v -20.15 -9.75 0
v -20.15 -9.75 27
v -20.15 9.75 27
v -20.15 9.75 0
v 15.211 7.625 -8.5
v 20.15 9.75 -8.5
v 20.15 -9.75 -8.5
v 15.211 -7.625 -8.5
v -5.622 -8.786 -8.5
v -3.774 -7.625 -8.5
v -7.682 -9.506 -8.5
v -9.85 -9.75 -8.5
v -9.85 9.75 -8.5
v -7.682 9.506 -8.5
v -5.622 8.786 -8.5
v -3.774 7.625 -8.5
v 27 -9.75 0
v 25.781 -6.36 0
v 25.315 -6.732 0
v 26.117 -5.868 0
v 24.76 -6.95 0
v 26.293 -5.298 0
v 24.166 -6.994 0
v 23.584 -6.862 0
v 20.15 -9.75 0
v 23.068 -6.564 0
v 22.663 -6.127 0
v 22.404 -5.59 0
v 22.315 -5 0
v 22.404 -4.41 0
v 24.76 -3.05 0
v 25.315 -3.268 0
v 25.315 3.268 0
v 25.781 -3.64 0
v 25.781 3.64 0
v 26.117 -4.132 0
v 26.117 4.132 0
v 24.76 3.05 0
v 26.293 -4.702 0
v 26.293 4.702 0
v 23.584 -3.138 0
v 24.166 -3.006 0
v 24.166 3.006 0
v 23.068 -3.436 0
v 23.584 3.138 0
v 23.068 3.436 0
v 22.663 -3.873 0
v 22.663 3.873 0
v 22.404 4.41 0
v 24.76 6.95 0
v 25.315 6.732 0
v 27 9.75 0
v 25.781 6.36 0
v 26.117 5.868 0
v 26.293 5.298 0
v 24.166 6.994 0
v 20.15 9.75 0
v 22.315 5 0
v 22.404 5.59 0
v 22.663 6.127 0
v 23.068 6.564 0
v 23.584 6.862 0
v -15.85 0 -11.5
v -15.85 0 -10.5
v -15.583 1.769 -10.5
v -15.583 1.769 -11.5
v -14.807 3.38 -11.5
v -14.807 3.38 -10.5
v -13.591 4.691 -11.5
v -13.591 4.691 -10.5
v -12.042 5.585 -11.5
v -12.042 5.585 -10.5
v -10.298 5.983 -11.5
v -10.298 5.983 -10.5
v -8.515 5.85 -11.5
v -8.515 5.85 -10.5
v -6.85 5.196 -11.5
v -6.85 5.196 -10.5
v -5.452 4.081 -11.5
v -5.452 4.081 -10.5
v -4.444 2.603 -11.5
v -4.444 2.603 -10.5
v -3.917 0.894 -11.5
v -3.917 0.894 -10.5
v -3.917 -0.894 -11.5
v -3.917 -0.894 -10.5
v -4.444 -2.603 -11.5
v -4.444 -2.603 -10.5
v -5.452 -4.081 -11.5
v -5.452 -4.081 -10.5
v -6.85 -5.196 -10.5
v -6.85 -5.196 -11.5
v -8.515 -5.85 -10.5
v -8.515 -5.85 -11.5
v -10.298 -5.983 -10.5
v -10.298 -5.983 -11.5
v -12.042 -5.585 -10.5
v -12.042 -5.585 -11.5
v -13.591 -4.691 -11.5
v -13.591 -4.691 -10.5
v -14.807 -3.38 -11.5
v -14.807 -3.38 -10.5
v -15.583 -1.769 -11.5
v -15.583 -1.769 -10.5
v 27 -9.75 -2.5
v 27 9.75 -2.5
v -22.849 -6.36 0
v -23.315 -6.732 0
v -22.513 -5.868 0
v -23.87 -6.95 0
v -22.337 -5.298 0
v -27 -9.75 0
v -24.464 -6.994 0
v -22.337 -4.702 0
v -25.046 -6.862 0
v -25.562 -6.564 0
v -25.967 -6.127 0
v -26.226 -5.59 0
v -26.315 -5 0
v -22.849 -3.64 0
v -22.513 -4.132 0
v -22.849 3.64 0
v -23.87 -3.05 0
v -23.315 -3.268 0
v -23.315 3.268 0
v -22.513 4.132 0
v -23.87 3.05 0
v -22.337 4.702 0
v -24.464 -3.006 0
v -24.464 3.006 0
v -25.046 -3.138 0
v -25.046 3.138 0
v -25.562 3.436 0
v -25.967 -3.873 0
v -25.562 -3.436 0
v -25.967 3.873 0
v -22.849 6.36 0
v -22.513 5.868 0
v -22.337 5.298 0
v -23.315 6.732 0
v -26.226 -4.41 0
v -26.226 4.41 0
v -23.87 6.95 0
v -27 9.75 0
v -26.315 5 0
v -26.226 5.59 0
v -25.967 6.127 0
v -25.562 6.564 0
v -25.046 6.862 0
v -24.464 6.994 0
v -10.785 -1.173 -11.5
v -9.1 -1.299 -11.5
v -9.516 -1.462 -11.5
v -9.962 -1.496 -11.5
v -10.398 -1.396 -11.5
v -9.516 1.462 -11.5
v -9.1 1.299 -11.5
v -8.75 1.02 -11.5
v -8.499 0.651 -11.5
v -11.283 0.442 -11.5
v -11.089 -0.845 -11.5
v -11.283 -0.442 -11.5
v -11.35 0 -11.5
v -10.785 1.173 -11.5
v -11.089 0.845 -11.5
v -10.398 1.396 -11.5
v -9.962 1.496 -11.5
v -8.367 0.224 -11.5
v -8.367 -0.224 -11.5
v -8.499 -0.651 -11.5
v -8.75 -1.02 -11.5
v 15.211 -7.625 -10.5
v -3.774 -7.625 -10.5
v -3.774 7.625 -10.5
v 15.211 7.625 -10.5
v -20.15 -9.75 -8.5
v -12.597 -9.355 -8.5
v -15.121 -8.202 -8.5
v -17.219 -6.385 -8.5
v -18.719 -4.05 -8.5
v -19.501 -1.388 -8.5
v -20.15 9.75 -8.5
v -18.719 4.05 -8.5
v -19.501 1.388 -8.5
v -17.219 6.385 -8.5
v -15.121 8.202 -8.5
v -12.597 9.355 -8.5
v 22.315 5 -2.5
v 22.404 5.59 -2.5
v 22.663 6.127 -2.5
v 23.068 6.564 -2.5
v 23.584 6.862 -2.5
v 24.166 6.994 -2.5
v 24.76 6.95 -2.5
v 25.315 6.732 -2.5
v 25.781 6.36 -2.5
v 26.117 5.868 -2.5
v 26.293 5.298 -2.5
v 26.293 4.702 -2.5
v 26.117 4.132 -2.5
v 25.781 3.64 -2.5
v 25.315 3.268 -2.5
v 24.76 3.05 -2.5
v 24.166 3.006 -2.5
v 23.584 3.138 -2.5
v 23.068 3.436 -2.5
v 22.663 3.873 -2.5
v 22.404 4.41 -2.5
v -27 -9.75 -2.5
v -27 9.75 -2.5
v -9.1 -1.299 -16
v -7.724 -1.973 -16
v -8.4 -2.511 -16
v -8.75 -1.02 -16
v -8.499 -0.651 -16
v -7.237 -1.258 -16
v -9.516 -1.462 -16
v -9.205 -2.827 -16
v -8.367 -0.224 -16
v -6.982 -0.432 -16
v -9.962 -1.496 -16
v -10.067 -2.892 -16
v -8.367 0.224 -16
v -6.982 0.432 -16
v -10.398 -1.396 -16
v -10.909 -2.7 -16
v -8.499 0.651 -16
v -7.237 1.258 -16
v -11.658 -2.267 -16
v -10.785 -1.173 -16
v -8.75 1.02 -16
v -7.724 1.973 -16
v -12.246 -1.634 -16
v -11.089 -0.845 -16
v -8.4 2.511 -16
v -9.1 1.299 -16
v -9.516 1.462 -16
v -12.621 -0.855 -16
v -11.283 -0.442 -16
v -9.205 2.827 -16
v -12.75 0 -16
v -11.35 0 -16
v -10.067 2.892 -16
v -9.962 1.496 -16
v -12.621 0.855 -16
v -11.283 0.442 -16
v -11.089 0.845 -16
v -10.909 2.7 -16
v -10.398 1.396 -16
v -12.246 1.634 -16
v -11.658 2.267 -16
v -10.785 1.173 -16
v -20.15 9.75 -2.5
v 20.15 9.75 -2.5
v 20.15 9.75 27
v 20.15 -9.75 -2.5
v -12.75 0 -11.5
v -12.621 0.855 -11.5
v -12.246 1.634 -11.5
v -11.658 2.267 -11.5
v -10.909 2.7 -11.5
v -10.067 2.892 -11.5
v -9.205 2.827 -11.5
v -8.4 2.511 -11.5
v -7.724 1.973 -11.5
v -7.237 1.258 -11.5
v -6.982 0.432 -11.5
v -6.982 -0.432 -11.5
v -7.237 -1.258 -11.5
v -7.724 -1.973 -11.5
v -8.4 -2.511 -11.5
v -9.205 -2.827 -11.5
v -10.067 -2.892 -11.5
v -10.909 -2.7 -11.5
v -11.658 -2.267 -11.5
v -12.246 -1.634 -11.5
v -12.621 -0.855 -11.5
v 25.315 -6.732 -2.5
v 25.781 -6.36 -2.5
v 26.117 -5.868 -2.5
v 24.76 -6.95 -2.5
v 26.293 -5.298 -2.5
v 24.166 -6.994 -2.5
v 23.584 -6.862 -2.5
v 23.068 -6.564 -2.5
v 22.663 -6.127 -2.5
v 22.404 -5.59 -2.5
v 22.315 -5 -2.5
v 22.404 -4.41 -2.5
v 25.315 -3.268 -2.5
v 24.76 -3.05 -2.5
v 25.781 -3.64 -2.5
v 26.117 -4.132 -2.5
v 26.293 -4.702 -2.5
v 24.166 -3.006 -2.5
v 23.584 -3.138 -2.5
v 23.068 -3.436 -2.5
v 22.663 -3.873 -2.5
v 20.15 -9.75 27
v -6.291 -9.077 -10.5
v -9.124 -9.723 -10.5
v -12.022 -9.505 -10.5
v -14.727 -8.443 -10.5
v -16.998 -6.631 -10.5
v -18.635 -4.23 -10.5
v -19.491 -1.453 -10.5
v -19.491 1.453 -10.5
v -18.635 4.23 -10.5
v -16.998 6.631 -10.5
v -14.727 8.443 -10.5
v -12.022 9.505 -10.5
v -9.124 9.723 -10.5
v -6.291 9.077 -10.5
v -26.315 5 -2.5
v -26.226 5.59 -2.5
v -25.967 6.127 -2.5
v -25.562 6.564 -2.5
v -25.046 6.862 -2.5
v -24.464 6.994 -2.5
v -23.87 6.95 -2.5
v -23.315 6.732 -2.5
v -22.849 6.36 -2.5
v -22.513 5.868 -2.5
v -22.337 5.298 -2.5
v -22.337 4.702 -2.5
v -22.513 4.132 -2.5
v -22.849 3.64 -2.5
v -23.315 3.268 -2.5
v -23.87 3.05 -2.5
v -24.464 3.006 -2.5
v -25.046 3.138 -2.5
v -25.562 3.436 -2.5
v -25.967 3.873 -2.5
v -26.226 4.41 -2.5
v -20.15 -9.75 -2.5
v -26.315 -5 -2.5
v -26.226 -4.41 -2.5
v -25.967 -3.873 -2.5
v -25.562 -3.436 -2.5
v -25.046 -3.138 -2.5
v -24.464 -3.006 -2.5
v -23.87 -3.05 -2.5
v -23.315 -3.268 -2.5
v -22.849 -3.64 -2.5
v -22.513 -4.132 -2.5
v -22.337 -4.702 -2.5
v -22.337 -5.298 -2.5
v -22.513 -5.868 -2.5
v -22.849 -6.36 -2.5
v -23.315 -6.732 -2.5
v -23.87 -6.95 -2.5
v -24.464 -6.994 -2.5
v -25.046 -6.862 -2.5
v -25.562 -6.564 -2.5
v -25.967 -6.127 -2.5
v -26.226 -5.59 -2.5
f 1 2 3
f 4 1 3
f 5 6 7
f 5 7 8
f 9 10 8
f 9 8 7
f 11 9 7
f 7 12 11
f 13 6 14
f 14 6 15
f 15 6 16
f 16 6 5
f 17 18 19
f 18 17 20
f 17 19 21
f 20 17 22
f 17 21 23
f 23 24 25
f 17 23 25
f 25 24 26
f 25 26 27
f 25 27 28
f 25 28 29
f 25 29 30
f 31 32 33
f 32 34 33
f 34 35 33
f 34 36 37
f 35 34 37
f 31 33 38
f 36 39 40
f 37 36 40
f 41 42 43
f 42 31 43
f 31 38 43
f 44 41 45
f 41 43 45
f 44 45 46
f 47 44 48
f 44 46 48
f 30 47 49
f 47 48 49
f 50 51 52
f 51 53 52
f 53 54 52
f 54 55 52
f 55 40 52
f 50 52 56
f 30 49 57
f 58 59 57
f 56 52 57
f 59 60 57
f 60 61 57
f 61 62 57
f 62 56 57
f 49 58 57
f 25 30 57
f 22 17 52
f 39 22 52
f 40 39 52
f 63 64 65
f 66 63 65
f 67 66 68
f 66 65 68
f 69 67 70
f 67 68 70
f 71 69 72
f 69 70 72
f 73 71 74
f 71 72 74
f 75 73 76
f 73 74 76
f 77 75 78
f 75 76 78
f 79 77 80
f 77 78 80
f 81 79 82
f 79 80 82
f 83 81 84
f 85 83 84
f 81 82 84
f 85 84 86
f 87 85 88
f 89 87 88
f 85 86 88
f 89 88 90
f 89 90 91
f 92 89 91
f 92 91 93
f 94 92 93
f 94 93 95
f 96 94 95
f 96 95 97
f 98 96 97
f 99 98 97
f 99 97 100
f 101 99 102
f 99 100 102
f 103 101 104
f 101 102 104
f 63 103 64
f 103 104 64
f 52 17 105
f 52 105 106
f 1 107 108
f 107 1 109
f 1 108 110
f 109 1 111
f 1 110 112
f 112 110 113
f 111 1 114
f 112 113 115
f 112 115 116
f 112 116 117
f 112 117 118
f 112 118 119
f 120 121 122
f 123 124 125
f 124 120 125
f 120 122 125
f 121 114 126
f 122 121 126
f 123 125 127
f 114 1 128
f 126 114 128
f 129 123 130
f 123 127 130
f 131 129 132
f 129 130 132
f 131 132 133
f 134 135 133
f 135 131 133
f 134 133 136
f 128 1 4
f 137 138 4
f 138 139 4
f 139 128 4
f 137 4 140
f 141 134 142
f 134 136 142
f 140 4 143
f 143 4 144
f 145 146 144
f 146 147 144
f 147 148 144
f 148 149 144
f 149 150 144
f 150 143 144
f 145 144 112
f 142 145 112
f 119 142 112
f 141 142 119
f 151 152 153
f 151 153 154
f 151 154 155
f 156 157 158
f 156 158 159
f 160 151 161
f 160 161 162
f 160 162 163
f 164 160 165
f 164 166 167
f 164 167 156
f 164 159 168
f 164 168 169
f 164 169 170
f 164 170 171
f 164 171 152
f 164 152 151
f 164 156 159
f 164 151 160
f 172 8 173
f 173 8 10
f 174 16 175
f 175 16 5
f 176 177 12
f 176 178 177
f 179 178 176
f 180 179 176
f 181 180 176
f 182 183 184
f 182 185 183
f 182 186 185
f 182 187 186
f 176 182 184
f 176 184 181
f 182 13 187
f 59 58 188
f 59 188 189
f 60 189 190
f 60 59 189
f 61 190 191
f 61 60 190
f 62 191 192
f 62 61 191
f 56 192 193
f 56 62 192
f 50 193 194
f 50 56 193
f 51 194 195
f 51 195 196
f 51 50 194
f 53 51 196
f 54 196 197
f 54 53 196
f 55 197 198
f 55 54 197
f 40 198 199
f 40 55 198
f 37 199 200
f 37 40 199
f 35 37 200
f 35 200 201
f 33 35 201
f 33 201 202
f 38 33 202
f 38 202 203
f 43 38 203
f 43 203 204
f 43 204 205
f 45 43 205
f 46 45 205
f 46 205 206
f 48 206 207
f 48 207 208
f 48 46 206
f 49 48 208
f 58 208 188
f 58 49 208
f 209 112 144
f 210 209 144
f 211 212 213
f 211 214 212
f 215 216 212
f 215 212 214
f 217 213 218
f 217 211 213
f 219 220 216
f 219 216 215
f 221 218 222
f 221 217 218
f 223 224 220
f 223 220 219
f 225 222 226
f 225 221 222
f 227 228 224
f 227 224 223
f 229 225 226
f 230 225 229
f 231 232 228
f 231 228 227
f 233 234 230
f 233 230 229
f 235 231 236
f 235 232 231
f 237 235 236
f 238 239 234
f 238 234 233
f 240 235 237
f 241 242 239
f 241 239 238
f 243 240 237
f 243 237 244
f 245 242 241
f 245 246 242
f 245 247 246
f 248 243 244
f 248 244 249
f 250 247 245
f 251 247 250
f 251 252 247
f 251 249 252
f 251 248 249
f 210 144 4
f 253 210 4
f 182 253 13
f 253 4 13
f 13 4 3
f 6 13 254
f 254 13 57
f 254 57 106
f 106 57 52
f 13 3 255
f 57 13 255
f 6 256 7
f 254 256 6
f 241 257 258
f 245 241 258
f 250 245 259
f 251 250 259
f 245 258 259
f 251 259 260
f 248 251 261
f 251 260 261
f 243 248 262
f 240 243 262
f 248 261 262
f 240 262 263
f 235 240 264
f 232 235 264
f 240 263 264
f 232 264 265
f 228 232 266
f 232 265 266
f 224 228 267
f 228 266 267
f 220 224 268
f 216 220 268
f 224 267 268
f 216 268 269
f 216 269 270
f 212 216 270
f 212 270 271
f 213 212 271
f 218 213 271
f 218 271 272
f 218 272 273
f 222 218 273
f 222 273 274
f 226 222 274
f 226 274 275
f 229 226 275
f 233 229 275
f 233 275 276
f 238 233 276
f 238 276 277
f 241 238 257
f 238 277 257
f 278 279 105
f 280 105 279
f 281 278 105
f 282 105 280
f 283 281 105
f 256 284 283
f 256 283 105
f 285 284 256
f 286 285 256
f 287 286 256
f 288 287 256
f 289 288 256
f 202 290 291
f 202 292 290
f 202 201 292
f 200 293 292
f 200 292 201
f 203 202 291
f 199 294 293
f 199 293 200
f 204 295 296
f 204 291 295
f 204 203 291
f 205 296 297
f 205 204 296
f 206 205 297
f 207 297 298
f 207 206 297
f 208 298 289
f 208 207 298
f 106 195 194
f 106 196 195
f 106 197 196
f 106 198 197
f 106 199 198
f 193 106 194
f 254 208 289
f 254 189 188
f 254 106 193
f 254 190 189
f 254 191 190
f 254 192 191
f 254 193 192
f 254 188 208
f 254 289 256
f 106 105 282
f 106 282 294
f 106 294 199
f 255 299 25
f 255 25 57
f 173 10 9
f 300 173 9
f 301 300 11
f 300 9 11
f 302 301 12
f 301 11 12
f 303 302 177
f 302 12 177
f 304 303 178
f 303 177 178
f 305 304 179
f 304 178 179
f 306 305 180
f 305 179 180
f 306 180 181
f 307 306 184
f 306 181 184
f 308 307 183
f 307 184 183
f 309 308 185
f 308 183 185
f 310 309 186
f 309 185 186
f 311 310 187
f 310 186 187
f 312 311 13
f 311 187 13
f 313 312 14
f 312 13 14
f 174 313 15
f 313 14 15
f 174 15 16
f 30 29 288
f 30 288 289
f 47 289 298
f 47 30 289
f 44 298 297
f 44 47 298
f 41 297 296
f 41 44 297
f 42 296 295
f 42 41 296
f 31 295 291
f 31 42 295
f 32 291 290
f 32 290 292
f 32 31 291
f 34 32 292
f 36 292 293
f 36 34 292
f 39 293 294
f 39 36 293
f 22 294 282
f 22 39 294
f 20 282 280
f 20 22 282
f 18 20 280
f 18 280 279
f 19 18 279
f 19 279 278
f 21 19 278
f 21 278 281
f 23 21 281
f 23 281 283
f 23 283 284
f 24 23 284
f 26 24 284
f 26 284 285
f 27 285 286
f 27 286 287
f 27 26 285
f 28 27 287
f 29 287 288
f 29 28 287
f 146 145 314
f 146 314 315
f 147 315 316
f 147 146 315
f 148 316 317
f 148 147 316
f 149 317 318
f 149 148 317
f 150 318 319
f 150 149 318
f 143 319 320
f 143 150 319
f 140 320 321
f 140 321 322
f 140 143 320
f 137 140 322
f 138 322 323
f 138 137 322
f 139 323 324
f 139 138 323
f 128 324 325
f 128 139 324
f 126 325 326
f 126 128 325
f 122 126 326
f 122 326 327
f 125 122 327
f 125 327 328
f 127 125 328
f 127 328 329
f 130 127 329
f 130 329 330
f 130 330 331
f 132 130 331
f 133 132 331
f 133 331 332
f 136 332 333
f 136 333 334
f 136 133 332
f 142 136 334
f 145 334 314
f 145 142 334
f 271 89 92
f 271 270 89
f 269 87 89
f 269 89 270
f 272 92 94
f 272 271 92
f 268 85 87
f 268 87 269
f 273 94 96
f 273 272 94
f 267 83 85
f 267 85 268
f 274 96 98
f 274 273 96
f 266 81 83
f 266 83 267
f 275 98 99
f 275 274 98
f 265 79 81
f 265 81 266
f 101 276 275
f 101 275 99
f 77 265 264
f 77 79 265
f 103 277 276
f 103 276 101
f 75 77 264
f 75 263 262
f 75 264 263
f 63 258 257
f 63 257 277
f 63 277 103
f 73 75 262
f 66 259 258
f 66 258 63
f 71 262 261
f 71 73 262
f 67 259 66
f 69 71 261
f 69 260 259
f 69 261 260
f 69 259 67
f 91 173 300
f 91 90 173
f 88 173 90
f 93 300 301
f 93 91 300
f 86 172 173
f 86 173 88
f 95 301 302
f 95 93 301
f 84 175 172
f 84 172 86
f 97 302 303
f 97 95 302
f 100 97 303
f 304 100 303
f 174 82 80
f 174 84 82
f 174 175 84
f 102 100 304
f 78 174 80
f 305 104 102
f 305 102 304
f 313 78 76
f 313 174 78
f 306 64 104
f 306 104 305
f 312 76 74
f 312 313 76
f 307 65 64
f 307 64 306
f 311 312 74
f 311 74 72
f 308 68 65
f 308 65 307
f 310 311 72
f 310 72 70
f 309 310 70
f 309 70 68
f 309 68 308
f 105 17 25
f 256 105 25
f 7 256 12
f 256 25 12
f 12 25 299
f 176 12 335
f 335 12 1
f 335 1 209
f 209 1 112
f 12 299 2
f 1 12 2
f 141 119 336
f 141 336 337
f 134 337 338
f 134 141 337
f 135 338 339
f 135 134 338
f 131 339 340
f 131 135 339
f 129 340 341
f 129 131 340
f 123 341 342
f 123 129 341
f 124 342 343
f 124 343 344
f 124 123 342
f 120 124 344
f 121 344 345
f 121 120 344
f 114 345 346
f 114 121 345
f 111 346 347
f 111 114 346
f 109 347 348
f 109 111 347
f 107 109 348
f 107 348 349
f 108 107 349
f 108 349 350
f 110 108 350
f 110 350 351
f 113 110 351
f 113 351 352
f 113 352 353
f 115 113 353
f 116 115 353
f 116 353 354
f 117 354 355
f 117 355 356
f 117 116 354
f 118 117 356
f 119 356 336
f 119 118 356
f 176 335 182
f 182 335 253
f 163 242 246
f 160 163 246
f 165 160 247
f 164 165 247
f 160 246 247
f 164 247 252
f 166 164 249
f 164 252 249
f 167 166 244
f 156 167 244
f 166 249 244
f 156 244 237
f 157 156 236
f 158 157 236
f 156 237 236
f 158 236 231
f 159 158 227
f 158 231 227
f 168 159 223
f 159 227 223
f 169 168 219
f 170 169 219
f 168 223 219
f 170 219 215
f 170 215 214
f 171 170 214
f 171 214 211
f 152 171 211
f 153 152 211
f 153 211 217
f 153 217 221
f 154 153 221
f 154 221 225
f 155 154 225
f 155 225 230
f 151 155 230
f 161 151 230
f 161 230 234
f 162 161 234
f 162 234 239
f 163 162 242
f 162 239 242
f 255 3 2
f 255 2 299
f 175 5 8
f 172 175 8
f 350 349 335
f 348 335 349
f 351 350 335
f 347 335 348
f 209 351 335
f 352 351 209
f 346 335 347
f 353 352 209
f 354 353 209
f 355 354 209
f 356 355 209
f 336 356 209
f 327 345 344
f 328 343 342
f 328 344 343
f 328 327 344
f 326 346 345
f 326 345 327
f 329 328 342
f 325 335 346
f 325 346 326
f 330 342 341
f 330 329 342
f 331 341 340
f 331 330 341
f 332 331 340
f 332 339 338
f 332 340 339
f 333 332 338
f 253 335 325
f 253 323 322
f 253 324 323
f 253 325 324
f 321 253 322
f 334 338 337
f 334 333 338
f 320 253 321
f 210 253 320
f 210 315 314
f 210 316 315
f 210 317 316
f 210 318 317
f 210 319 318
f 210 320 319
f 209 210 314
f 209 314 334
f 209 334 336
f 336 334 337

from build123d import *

# Parameters (mm, degrees)
SKETCH_1_W          = 40.3
SKETCH_1_H          = 19.5
EXTRUDE_1_DEPTH     = 27
SKETCH_2_W          = 6.85
SKETCH_2_H          = 19.5
SKETCH_2_R          = 2
SKETCH_2_W_2        = 20.15
EXTRUDE_2_DEPTH     = 2.5
SKETCH_3_W          = 40.3
SKETCH_3_H          = 19.5
EXTRUDE_3_DEPTH     = 6
EXTRUDE_4_DEPTH     = 2
SKETCH_5_R          = 6
EXTRUDE_5_DEPTH     = 1
SKETCH_6_R          = 2.9
EXTRUDE_6_DEPTH     = 4.5
SKETCH_7_R          = 1.5
CUT_EXTRUDE_1_DEPTH = 4.5


with BuildPart() as part:
    # 草图1 → 凸台-拉伸1 (new body)
    with BuildSketch(Plane.XY):
        Rectangle(SKETCH_1_W, SKETCH_1_H)
    extrude(amount=EXTRUDE_1_DEPTH)

    # 草图2 → 凸台-拉伸2 (add)
    with BuildSketch(Plane(origin=(0, 0, 0), x_dir=(-1, 0, 0), z_dir=(0, 0, -1))):
        with Locations((23.575, 0)):
            Rectangle(SKETCH_2_W, SKETCH_2_H)
        with Locations((24.315, -5)):
            Circle(SKETCH_2_R, mode=Mode.SUBTRACT)
        with Locations((24.315, 5)):
            Circle(SKETCH_2_R, mode=Mode.SUBTRACT)
        with Locations((10.075, 0)):
            Rectangle(SKETCH_2_W_2, SKETCH_2_H)
        with Locations((-23.575, 0)):
            Rectangle(SKETCH_2_W, SKETCH_2_H)
        with Locations((-24.315, -5)):
            Circle(SKETCH_2_R, mode=Mode.SUBTRACT)
        with Locations((-24.315, 5)):
            Circle(SKETCH_2_R, mode=Mode.SUBTRACT)
        with Locations((-10.075, 0)):
            Rectangle(SKETCH_2_W_2, SKETCH_2_H)
    extrude(amount=EXTRUDE_2_DEPTH)

    # 草图3 → 凸台-拉伸3 (add)
    with BuildSketch(Plane(origin=(0, 0, -2.5), x_dir=(-1, 0, 0), z_dir=(0, 0, -1))):
        Rectangle(SKETCH_3_W, SKETCH_3_H)
    extrude(amount=EXTRUDE_3_DEPTH)

    # 草图4 → 凸台-拉伸4 (add)
    with BuildSketch(Plane(origin=(0, 0, -8.5), x_dir=(-1, 0, 0), z_dir=(0, 0, -1))):
        with BuildLine():
            Line((3.774052971, 7.62531099), (-15.211090867, 7.62531099))
            Line((-15.211090867, 7.62531099), (-15.211090867, -7.62531099))
            Line((-15.211090867, -7.62531099), (3.774052971, -7.62531099))
            ThreePointArc((3.774052971, -7.62531099), (19.6, 0), (3.774052971, 7.62531099))
        make_face()
    extrude(amount=EXTRUDE_4_DEPTH)

    # 草图5 → 凸台-拉伸5 (add)
    with BuildSketch(Plane(origin=(0, 0, -10.5), x_dir=(-1, 0, 0), z_dir=(0, 0, -1))):
        with Locations((9.85, 0)):
            Circle(SKETCH_5_R)
    extrude(amount=EXTRUDE_5_DEPTH)

    # 草图6 → 凸台-拉伸6 (add)
    with BuildSketch(Plane(origin=(0, 0, -11.5), x_dir=(-1, 0, 0), z_dir=(0, 0, -1))):
        with Locations((9.85, 0)):
            Circle(SKETCH_6_R)
    extrude(amount=EXTRUDE_6_DEPTH)

    # 草图7 → 切除-拉伸1 (cut)
    with BuildSketch(Plane(origin=(0, 0, -16), x_dir=(-1, 0, 0), z_dir=(0, 0, -1))):
        with Locations((9.85, 0)):
            Circle(SKETCH_7_R)
    extrude(amount=-CUT_EXTRUDE_1_DEPTH, mode=Mode.SUBTRACT)


solid = part.part
